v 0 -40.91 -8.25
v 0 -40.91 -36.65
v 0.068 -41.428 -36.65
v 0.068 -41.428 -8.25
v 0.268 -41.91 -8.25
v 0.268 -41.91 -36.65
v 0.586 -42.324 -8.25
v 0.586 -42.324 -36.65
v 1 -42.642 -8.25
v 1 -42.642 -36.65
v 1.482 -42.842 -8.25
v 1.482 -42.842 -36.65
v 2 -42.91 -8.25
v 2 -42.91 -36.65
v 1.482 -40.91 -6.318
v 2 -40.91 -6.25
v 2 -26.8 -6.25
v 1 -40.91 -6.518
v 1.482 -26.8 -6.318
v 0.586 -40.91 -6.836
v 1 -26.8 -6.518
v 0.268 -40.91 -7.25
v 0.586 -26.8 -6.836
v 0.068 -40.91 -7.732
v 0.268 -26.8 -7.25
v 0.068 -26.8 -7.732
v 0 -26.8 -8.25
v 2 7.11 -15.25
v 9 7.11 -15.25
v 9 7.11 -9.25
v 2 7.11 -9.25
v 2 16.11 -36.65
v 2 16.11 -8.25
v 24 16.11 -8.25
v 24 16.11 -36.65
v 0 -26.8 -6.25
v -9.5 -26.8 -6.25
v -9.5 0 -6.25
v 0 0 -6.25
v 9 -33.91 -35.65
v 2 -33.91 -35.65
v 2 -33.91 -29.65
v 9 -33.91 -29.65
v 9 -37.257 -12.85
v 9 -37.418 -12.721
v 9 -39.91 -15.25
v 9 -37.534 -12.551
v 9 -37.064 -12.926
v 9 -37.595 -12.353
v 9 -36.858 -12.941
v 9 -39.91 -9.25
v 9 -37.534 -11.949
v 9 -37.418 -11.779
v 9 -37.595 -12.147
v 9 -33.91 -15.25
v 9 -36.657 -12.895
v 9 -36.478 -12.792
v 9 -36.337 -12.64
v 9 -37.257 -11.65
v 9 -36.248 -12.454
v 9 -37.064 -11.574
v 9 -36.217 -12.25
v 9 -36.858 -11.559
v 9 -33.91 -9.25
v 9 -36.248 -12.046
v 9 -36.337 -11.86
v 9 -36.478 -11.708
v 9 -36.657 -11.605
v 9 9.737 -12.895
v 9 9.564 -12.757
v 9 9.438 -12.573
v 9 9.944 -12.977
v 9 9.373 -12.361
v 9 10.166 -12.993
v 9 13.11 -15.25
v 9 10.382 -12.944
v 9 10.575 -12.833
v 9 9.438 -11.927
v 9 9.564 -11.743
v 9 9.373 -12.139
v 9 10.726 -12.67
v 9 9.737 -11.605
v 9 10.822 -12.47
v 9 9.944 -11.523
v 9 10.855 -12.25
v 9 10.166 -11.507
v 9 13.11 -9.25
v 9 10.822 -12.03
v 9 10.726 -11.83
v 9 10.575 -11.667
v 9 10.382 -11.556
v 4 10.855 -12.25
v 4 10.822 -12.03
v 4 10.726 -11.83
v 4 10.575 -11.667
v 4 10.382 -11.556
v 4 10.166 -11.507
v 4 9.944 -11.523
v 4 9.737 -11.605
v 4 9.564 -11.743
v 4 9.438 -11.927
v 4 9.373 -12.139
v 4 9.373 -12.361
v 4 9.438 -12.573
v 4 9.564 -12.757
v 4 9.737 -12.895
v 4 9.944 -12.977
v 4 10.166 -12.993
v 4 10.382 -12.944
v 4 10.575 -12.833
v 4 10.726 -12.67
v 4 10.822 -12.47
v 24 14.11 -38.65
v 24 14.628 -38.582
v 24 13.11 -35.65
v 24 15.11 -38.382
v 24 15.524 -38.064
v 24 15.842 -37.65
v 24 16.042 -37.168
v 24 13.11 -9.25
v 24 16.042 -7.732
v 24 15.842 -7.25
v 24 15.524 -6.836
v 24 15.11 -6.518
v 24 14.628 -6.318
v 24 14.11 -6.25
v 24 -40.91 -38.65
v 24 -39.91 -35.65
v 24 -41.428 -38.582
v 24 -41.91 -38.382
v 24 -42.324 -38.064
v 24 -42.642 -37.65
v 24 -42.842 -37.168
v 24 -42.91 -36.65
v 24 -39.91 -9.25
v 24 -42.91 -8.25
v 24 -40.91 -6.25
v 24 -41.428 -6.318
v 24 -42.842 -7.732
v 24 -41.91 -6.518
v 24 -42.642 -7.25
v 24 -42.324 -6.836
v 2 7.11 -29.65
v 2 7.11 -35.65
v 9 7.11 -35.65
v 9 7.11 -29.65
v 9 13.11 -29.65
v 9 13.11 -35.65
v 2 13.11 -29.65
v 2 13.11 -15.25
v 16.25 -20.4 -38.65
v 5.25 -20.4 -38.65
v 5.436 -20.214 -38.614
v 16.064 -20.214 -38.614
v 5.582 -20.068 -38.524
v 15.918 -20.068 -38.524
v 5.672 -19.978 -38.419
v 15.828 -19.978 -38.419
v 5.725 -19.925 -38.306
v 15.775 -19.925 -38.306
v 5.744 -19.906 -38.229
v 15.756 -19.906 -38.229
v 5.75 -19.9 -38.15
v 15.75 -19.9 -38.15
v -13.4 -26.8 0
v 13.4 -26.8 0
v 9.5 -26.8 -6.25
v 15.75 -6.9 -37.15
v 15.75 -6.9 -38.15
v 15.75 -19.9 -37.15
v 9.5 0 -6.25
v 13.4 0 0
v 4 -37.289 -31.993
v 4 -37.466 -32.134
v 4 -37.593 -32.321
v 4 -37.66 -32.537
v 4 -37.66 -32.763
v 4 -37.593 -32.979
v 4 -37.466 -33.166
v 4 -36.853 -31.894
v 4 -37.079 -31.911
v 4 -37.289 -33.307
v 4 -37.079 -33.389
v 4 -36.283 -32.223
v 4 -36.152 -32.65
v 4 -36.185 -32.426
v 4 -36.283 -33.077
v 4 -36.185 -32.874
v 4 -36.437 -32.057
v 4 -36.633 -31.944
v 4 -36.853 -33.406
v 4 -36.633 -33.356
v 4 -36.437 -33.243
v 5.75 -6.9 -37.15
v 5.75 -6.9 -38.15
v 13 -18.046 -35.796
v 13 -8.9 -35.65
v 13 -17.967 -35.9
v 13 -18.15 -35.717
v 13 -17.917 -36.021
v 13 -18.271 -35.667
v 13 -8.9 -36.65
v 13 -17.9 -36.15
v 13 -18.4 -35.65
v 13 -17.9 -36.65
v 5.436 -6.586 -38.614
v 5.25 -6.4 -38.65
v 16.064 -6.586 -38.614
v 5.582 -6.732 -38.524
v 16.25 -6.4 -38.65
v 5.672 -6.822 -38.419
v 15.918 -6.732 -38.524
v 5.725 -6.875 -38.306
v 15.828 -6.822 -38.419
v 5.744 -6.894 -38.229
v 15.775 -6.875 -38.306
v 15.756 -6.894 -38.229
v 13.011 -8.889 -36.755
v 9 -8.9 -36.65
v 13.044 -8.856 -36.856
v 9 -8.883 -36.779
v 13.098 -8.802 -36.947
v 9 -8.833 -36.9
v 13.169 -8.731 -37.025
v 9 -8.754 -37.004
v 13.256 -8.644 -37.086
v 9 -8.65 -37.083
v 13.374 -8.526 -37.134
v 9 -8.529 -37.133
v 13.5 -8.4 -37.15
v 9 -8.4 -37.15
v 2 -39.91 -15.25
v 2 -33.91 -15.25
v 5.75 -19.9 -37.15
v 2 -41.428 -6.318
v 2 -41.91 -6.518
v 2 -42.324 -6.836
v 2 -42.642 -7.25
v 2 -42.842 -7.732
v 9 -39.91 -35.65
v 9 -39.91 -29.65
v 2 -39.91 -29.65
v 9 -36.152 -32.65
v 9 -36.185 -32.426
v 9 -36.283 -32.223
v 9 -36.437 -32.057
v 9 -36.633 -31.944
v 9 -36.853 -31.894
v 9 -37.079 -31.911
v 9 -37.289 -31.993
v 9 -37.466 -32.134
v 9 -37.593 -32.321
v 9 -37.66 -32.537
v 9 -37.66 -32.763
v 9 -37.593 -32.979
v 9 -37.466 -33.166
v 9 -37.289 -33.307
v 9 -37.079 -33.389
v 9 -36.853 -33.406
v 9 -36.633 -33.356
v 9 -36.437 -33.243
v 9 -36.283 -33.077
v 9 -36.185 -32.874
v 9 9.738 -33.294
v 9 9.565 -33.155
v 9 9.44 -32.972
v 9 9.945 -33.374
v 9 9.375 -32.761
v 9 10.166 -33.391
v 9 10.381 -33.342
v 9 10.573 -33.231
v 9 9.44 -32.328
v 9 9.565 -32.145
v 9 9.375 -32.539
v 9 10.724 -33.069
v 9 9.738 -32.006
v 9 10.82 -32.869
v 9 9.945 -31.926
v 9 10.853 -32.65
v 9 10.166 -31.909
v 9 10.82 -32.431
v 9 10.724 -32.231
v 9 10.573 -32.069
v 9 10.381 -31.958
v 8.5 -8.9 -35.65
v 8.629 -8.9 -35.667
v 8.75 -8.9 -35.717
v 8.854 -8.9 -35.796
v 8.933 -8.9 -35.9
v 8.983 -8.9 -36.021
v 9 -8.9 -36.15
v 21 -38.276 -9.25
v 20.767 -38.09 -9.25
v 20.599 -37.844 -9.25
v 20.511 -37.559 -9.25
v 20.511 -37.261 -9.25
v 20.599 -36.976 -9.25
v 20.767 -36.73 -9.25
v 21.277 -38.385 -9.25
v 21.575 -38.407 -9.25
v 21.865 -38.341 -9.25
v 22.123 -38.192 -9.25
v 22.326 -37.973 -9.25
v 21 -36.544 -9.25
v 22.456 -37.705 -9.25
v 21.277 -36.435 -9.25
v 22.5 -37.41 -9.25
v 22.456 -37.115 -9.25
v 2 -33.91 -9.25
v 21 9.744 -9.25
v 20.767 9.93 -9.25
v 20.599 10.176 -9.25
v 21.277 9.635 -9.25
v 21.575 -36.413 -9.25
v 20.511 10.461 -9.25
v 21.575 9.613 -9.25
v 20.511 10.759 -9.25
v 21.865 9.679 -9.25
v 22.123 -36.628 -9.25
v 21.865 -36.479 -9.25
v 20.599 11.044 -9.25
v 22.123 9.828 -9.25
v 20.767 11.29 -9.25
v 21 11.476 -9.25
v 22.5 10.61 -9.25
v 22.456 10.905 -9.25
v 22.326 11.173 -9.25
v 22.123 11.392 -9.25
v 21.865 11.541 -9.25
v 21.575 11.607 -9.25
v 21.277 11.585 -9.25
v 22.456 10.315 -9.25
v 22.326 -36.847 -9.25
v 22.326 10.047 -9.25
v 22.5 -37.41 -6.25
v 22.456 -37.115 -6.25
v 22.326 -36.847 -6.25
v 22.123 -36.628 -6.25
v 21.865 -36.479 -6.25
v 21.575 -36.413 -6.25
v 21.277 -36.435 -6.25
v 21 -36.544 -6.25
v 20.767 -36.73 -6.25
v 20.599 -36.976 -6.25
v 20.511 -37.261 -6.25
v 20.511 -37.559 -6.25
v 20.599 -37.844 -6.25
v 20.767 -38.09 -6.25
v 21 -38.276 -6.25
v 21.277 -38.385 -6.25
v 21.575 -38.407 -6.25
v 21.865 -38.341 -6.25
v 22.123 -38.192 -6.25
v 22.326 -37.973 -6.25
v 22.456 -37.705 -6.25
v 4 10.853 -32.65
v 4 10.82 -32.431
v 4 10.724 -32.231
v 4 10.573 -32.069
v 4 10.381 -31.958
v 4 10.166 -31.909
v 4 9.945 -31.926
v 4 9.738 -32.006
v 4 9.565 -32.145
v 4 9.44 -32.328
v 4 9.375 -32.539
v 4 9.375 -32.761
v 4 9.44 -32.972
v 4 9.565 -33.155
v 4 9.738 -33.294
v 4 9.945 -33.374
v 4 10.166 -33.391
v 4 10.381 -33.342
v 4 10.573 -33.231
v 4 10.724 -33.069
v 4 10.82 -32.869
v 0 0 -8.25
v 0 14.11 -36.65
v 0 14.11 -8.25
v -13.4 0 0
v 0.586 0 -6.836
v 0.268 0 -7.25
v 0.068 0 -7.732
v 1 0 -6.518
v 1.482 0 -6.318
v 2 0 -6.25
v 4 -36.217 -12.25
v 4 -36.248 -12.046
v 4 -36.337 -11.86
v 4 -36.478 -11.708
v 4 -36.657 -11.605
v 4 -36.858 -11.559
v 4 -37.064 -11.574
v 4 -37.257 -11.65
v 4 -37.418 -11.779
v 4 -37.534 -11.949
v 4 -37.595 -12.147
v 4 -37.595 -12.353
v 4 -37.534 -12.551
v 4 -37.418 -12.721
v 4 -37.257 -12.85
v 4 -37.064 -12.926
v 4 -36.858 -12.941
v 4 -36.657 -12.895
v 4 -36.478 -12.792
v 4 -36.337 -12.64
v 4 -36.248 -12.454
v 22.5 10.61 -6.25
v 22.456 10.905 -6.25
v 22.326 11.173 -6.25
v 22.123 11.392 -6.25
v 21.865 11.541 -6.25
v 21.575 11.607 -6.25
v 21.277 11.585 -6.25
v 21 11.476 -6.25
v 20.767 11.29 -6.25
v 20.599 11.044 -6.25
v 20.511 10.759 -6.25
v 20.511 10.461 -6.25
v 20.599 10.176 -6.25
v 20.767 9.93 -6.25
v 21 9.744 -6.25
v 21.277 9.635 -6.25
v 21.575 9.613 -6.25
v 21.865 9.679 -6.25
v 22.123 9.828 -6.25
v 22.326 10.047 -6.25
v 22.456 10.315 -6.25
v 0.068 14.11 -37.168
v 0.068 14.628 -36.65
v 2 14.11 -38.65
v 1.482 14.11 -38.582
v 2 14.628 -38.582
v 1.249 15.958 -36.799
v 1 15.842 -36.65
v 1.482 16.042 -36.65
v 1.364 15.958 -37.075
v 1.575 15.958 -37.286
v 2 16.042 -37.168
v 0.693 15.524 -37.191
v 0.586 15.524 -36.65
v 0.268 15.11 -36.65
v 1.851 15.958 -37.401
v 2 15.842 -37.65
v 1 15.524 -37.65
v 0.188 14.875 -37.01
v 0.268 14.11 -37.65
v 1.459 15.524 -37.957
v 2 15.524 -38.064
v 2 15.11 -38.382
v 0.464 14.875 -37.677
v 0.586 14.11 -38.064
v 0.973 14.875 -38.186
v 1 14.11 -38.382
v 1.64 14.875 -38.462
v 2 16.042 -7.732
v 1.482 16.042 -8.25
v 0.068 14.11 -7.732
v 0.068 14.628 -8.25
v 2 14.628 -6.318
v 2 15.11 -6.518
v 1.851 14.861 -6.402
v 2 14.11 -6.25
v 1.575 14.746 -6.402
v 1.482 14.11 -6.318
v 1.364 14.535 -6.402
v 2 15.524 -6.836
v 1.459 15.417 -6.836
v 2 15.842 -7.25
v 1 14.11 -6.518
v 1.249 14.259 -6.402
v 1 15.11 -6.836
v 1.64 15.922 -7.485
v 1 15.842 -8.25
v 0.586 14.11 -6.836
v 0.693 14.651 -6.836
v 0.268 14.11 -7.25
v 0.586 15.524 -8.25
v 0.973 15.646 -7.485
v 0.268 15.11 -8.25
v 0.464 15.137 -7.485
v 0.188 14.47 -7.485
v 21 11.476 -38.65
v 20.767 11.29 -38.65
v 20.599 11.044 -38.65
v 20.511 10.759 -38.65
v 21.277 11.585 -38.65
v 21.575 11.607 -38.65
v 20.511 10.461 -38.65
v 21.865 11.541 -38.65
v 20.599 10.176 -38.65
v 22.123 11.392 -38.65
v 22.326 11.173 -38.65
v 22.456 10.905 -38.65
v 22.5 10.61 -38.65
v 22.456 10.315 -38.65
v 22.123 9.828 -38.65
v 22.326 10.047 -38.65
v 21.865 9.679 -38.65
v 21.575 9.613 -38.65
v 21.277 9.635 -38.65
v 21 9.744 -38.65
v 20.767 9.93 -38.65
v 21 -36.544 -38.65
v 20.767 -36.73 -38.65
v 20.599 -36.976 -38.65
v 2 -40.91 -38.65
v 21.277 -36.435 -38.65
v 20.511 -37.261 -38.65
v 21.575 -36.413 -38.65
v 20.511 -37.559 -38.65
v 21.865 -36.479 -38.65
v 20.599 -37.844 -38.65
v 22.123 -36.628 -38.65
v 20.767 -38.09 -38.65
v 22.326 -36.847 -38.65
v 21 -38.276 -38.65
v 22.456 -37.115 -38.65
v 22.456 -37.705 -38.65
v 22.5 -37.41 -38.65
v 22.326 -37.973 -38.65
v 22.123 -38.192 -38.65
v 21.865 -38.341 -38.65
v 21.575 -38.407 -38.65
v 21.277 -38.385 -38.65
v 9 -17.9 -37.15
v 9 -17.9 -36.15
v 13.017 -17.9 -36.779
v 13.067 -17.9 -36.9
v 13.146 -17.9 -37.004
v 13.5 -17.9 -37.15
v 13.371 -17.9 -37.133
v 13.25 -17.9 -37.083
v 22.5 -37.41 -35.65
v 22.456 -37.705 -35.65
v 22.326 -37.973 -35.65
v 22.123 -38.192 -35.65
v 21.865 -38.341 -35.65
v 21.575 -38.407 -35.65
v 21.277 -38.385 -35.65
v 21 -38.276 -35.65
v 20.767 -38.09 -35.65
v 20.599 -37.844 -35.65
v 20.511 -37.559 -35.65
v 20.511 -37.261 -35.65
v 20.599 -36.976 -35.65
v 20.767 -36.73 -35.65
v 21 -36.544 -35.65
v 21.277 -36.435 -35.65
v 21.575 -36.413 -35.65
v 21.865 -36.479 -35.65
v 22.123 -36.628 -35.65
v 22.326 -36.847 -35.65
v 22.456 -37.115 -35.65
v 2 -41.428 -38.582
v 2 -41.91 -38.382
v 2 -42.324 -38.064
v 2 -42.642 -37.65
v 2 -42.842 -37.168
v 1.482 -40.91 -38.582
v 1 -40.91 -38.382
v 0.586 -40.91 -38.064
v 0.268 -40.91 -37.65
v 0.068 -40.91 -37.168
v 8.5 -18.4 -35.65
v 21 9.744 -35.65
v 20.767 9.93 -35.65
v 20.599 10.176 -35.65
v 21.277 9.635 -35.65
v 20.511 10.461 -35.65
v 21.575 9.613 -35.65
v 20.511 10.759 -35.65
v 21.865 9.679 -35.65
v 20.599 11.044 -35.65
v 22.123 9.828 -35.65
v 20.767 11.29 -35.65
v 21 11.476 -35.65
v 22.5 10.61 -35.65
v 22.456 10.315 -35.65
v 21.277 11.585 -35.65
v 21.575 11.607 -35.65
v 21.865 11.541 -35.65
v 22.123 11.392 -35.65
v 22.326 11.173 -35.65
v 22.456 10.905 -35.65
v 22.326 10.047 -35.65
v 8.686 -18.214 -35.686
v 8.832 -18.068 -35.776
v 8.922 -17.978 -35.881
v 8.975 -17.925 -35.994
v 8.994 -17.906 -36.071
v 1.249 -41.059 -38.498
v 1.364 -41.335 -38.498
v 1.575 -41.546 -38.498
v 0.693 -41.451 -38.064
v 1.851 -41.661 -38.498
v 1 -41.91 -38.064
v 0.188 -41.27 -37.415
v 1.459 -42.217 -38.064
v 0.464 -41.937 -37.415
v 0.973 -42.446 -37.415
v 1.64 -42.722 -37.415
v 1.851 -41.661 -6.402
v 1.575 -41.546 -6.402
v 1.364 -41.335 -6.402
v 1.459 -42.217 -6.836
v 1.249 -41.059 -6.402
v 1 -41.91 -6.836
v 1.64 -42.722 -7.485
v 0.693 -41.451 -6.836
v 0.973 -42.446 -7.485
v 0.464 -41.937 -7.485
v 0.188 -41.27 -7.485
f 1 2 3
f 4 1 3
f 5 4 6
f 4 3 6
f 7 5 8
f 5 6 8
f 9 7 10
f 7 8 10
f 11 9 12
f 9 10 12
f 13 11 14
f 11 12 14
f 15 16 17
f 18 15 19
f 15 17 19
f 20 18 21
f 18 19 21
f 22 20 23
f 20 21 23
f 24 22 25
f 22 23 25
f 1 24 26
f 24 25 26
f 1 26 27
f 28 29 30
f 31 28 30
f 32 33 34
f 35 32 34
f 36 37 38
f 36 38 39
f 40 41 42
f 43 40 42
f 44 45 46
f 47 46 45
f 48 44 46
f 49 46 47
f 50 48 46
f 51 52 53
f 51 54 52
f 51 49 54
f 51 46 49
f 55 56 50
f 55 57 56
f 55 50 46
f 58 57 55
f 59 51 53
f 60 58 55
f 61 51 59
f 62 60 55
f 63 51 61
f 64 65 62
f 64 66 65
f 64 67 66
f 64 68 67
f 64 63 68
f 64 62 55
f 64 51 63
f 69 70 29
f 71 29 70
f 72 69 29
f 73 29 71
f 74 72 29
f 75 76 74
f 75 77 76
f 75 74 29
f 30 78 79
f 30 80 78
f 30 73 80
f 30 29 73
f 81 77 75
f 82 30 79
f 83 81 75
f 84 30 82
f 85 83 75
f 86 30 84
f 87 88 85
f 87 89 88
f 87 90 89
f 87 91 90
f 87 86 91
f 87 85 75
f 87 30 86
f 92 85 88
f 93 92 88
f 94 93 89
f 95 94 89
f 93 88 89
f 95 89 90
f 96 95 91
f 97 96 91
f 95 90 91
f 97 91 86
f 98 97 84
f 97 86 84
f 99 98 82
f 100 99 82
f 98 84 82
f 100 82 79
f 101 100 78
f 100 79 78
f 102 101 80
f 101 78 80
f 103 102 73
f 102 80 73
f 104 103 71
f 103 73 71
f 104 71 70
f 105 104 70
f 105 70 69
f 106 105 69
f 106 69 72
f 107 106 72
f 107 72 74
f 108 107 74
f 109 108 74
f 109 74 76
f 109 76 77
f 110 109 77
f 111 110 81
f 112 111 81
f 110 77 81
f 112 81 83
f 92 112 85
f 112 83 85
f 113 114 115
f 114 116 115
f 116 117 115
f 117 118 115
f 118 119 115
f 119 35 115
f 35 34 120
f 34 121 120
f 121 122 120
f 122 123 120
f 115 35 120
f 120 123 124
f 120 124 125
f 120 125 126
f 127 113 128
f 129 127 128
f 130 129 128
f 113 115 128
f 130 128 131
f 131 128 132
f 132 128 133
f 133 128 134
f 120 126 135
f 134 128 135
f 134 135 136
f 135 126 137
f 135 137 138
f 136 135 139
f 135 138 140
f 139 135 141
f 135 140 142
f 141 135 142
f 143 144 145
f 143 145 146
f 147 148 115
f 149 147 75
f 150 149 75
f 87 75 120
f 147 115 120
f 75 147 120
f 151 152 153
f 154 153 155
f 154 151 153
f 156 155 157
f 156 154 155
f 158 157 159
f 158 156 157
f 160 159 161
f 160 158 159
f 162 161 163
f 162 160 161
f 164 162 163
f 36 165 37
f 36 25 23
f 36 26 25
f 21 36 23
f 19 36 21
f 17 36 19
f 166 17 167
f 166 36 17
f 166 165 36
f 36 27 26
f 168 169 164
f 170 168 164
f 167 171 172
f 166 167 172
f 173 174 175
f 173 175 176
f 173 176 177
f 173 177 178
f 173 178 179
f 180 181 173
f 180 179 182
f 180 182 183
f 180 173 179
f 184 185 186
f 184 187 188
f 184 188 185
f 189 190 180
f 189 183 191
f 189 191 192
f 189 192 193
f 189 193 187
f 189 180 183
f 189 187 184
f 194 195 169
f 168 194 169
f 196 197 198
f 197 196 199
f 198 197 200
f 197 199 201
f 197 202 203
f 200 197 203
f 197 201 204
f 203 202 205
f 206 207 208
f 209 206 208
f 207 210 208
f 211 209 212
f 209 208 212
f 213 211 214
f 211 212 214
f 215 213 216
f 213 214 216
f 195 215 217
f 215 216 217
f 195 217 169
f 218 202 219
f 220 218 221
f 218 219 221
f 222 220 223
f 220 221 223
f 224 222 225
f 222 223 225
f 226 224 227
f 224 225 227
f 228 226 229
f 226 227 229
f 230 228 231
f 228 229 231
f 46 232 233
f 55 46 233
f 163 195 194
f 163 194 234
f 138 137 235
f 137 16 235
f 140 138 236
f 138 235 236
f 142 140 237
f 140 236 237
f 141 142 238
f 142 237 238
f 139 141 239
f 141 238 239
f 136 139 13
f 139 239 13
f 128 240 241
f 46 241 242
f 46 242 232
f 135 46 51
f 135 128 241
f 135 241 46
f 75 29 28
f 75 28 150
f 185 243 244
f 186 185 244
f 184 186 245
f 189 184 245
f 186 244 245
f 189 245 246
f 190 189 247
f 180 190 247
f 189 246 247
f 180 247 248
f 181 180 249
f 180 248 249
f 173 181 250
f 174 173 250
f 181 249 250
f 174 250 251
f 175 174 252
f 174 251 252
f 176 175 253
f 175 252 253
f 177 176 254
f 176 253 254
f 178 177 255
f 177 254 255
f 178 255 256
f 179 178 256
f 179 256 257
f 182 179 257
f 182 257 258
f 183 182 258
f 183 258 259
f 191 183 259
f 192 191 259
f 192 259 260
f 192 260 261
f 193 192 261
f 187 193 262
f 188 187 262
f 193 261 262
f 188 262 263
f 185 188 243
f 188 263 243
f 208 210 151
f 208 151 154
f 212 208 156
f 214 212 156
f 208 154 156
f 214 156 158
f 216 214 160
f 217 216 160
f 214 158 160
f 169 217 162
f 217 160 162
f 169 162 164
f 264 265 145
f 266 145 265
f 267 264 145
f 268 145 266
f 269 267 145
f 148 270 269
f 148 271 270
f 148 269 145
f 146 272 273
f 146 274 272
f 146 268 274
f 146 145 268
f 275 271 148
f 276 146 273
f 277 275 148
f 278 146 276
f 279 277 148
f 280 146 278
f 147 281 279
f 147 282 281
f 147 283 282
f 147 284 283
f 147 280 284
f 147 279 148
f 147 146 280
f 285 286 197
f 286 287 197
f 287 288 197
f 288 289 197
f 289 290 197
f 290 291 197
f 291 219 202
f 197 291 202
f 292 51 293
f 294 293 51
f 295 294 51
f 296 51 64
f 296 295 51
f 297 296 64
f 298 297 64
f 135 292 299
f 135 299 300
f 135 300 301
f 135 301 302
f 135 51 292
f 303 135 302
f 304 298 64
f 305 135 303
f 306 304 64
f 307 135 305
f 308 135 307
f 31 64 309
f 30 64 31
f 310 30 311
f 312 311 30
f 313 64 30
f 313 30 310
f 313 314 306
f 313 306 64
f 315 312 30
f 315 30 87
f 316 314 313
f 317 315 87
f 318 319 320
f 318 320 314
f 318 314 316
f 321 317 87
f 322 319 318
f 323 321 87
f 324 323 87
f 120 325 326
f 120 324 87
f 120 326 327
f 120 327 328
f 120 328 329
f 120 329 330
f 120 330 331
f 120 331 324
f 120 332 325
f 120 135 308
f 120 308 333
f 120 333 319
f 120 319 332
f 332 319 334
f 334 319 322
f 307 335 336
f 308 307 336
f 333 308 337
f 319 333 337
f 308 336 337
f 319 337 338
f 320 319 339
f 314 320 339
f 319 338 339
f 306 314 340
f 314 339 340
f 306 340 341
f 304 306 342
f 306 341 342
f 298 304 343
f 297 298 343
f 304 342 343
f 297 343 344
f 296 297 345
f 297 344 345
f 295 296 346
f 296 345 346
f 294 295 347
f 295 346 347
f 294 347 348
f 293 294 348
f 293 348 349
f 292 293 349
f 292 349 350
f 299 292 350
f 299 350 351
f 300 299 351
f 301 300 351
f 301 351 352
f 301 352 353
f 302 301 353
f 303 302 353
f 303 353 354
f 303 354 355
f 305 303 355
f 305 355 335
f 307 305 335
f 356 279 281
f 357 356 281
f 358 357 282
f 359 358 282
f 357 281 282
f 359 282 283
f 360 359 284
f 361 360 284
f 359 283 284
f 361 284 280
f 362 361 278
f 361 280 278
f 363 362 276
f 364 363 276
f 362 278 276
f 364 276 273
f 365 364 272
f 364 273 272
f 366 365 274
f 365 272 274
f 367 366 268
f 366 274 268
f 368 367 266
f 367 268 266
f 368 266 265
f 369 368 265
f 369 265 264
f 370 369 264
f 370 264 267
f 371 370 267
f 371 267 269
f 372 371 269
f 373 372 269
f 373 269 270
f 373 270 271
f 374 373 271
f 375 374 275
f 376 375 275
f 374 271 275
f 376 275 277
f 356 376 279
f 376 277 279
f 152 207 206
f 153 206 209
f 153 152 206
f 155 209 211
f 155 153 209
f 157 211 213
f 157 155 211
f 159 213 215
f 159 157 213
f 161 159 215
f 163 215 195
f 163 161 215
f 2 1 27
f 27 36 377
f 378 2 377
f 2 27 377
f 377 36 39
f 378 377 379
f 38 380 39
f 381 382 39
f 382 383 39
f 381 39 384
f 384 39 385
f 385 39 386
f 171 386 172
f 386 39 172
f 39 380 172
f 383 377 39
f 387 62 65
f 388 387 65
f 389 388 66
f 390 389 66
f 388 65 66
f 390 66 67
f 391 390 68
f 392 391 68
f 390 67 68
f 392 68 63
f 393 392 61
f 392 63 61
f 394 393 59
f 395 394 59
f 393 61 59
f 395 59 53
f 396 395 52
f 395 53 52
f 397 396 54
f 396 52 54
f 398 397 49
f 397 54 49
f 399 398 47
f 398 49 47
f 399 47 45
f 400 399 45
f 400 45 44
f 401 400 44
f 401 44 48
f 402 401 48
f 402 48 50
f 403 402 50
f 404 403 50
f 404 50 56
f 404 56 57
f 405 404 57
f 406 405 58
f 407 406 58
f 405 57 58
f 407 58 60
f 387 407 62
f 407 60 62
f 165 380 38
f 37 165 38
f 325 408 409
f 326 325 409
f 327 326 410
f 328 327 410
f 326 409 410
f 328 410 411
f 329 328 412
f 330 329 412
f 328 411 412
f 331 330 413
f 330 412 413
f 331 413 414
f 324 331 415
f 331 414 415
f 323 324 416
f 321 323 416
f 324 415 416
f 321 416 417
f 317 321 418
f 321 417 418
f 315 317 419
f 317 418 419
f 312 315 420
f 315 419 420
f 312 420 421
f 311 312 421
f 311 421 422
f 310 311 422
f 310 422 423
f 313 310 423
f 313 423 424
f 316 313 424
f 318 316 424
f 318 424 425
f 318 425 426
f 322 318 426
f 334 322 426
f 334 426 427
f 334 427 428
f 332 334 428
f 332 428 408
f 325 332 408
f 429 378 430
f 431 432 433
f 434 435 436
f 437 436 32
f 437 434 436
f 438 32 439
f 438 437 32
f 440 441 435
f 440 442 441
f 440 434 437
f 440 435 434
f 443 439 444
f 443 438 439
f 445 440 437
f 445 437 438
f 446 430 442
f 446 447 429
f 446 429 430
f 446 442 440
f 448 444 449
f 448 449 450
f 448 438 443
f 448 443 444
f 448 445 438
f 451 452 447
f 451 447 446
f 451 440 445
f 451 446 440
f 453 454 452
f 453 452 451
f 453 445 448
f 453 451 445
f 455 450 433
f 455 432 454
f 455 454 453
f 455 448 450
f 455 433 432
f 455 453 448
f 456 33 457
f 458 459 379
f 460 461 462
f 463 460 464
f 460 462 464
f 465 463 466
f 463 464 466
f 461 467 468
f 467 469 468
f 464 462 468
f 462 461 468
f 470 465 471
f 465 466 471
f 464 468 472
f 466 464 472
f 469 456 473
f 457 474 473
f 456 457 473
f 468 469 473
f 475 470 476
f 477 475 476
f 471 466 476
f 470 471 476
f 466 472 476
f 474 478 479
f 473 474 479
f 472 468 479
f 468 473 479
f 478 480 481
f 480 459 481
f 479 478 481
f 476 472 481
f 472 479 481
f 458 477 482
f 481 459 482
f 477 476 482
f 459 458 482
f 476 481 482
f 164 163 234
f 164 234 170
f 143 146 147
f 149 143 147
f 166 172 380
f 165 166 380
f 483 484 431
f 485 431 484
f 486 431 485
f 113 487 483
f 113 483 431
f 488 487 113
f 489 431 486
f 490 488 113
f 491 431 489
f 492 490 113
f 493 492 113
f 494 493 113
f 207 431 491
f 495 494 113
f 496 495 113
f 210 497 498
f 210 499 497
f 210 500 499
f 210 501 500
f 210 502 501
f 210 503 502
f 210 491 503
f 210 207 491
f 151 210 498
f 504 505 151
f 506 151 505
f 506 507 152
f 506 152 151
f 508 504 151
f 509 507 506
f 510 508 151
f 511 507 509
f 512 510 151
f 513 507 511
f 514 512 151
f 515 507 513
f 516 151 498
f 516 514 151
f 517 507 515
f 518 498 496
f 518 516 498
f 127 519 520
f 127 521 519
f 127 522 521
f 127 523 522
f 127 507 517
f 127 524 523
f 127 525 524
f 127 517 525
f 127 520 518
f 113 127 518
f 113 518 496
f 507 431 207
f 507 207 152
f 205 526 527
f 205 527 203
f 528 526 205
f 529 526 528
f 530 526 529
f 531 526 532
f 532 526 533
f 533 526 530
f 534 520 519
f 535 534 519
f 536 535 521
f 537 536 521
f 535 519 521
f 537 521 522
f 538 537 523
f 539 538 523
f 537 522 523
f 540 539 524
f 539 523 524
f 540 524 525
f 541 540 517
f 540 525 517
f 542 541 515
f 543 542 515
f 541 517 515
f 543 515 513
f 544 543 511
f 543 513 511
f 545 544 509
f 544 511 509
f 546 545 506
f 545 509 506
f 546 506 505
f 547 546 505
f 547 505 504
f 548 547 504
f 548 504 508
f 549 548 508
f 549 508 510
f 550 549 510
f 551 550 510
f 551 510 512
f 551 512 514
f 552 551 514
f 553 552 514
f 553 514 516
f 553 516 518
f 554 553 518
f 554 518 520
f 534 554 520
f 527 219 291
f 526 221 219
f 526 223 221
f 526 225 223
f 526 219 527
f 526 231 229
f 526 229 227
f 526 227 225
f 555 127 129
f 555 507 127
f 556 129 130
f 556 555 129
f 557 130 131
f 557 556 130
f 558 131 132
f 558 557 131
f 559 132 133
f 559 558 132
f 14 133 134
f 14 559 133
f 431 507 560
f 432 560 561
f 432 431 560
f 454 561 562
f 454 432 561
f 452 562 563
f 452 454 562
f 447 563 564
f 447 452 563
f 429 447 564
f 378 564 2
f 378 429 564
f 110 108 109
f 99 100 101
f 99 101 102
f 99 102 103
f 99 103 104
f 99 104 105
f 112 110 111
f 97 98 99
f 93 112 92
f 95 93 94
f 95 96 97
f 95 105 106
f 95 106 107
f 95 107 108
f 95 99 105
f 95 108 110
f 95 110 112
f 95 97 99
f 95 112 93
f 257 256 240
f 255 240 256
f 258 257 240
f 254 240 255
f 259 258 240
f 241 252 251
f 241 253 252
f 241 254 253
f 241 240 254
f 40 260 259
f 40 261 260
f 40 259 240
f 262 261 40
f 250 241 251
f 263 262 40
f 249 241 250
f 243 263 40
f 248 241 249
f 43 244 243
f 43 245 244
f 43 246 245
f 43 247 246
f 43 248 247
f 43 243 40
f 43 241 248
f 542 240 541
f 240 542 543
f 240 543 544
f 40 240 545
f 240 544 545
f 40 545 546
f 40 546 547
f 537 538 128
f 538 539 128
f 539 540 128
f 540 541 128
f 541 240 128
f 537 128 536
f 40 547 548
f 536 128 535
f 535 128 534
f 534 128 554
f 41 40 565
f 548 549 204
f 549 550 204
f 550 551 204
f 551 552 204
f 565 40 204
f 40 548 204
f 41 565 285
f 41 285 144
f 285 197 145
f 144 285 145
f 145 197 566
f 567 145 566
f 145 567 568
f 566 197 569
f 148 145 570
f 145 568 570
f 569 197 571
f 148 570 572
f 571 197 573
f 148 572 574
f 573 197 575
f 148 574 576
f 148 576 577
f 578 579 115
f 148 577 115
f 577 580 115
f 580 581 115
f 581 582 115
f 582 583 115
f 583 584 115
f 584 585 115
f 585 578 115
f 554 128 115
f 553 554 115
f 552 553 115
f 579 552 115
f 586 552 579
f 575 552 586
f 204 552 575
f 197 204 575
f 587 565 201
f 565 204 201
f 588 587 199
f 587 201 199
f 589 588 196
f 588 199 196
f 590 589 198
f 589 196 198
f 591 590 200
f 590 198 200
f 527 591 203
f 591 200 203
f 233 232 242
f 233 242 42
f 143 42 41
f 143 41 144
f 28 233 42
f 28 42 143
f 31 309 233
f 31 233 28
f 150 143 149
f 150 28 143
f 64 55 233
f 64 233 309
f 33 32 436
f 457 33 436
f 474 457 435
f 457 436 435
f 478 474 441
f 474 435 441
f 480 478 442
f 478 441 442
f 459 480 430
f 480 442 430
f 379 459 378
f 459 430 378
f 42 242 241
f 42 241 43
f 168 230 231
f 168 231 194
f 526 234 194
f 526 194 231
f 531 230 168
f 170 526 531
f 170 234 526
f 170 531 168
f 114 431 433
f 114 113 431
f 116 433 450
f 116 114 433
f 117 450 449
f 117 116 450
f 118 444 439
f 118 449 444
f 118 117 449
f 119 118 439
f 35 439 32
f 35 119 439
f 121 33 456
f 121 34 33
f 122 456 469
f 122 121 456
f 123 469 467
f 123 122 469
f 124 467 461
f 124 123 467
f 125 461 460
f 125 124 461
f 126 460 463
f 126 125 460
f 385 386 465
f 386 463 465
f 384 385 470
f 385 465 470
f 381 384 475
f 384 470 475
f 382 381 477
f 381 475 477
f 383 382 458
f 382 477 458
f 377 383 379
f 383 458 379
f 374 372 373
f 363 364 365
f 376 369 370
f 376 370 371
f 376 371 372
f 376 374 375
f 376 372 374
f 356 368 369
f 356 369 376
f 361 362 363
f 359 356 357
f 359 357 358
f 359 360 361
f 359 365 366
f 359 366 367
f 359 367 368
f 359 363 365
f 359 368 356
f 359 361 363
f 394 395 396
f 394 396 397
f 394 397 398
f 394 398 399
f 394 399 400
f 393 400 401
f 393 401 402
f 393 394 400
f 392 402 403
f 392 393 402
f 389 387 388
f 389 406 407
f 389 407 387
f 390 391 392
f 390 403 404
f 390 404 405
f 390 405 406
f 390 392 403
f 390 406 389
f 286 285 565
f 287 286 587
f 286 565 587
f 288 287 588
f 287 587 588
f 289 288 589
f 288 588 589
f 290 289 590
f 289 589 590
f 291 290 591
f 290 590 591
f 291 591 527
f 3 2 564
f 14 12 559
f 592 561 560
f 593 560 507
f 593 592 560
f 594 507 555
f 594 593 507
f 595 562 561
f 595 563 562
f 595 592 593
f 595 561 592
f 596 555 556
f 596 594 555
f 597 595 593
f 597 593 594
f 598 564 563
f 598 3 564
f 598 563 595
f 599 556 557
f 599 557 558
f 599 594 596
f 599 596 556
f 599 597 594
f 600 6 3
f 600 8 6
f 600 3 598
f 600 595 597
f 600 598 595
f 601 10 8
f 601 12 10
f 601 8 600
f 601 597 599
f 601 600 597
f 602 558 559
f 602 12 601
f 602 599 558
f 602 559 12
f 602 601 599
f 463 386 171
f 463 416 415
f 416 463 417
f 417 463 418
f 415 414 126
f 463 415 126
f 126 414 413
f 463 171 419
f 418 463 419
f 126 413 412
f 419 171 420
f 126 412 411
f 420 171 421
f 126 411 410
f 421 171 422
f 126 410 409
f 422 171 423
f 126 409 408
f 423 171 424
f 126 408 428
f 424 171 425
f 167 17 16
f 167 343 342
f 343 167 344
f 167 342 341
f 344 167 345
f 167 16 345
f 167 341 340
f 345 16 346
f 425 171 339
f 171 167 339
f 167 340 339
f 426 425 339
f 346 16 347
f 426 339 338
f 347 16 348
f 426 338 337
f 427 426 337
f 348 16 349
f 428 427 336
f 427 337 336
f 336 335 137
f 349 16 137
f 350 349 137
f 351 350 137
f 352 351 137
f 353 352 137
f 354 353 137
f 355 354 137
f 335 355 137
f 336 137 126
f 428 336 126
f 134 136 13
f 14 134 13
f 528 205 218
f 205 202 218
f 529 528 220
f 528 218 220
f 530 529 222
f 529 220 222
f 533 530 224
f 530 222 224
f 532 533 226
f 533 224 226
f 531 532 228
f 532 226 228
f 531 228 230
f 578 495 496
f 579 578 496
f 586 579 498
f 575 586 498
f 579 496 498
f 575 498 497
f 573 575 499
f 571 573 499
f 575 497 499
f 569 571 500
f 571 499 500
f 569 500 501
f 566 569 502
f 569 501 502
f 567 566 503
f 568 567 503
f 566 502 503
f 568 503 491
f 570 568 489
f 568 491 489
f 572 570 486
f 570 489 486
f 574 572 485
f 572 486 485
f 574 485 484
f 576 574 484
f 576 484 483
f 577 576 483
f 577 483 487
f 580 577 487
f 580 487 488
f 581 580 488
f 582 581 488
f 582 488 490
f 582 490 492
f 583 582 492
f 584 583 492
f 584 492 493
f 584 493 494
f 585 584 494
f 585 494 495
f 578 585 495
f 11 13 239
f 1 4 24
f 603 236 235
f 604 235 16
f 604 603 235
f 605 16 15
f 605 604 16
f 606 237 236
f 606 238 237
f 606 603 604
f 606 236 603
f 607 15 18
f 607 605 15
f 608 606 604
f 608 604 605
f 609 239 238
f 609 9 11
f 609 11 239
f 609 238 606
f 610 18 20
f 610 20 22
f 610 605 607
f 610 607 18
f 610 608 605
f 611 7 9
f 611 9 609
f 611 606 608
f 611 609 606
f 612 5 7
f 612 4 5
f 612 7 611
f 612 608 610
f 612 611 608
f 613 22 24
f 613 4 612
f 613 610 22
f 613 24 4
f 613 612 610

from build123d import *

# Parameters (mm, degrees)
F1_DEPTH  = 26.8
F2_W      = 9.5
F2_H      = 26.8
F3_DEPTH  = 32.4
F4_W      = 53.02
F4_H      = 26.4
F5_DEPTH  = 15
F6_W      = 41.02
F6_H      = 26.4
F7_DEPTH  = 7
F8_W      = 33.1776287834
F8_H      = 14.4
F9_DEPTH  = 7
F10_W     = 16.1501816639
F10_H     = 14.4
F11_DEPTH = 7
F12_R     = 0.6930745825
F13_DEPTH = 5
F14_R     = 0.7453155857
F15_DEPTH = 5
F16_R     = 0.7584591481
F17_DEPTH = 5
F18_R     = 0.7431215043
F19_DEPTH = 5
F20_W     = 4
F20_H     = 9
F21_DEPTH = 5
F22_W     = 10
F22_H     = 13
F23_DEPTH = 1.5
F24_R     = 0.5
F25_R     = 2
F26_R     = 1
F27_DEPTH = 5
F28_R     = 1
F29_DEPTH = 5
F30_R     = 1
F31_DEPTH = 5
F32_R     = 1
F33_DEPTH = 5


with BuildPart() as f1:
    # F0 (on Front) → F1 (new body)
    with BuildSketch(Plane.XZ):
        Polygon((13.4, 0), (-13.4, 0), (-9.5, -6.25), (9.5, -6.25), align=None)
    extrude(amount=F1_DEPTH)

    # F2 (on face) → F3 (join)
    with BuildSketch(Plane(origin=(0, 0, -6.25), x_dir=(1, 0, 0), z_dir=(0, 0, -1))):
        Polygon((24, 42.91), (0, 42.91), (0, 26.8), (9.5, 26.8), (9.5, 0), (0, 0), (0, -16.11), (24, -16.11), align=None)
        with Locations((4.75, 13.4)):
            Rectangle(F2_W, F2_H)
    extrude(amount=F3_DEPTH)

    # F4 (on face) → F5 (cut)
    with BuildSketch(Plane.YZ.offset(24)):
        with Locations((-13.4, -22.45)):
            Rectangle(F4_W, F4_H)
    extrude(amount=-F5_DEPTH, mode=Mode.SUBTRACT)

    # F6 (on face) → F7 (cut)
    with BuildSketch(Plane.YZ.offset(9)):
        with Locations((-13.4, -22.45)):
            Rectangle(F6_W, F6_H)
    extrude(amount=-F7_DEPTH, mode=Mode.SUBTRACT)

    # F8 (on face) → F9 (cut)
    with BuildSketch(Plane.YZ.offset(9)):
        with Locations((-23.3211856083, -22.45)):
            Rectangle(F8_W, F8_H)
    extrude(amount=-F9_DEPTH, mode=Mode.SUBTRACT)

    # F10 (on face) → F11 (cut)
    with BuildSketch(Plane.YZ.offset(9)):
        with Locations((5.0349091681, -22.45)):
            Rectangle(F10_W, F10_H)
    extrude(amount=-F11_DEPTH, mode=Mode.SUBTRACT)

    # F12 (on face) → F13 (cut)
    with BuildSketch(Plane.YZ.offset(9)):
        with Locations((-36.91, -12.25)):
            Circle(F12_R)
    extrude(amount=-F13_DEPTH, mode=Mode.SUBTRACT)

    # F14 (on face) → F15 (cut)
    with BuildSketch(Plane.YZ.offset(9)):
        with Locations((10.11, -12.25)):
            Circle(F14_R)
    extrude(amount=-F15_DEPTH, mode=Mode.SUBTRACT)

    # F16 (on face) → F17 (cut)
    with BuildSketch(Plane.YZ.offset(9)):
        with Locations((-36.91, -32.65)):
            Circle(F16_R)
    extrude(amount=-F17_DEPTH, mode=Mode.SUBTRACT)

    # F18 (on face) → F19 (cut)
    with BuildSketch(Plane.YZ.offset(9)):
        with Locations((10.11, -32.65)):
            Circle(F18_R)
    extrude(amount=-F19_DEPTH, mode=Mode.SUBTRACT)

    # F20 (on face) → F21 (cut)
    with BuildSketch(Plane(origin=(0, 0, -38.65), x_dir=(1, 0, 0), z_dir=(0, 0, -1))):
        with Locations((11, 13.4)):
            Rectangle(F20_W, F20_H)
    extrude(amount=-F21_DEPTH, mode=Mode.SUBTRACT)

    # F22 (on face) → F23 (cut)
    with BuildSketch(Plane(origin=(0, 0, -38.65), x_dir=(1, 0, 0), z_dir=(0, 0, -1))):
        with Locations((10.75, 13.4)):
            Rectangle(F22_W, F22_H)
    extrude(amount=-F23_DEPTH, mode=Mode.SUBTRACT)

    # F24
    f24_edges = [f1.edges().sort_by_distance(p)[0] for p in [
        (5.75, -13.4, -38.65),
        (9, -13.4, -35.65),
        (13, -13.4, -37.15),
        (10.75, -6.9, -38.65),
        (11, -8.9, -37.15),
        (11, -17.9, -35.65),
        (15.75, -13.4, -38.65),
        (10.75, -19.9, -38.65),
    ]]
    fillet(f24_edges, radius=F24_R)

    # F25
    f25_edges = [f1.edges().sort_by_distance(p)[0] for p in [
        (0, -42.91, -22.45),
        (0, -13.4, -38.65),
        (0, 16.11, -22.45),
        (12, -42.91, -38.65),
        (12, -42.91, -6.25),
        (12, 16.11, -38.65),
        (12, 16.11, -6.25),
        (0, 8.055, -6.25),
        (0, -34.855, -6.25),
    ]]
    fillet(f25_edges, radius=F25_R)

    # F26 (on face) → F27 (cut)
    with BuildSketch(Plane(origin=(0, 0, -38.65), x_dir=(1, 0, 0), z_dir=(0, 0, -1))):
        with Locations((21.5, 37.41)):
            Circle(F26_R)
    extrude(amount=-F27_DEPTH, mode=Mode.SUBTRACT)

    # F28 (on face) → F29 (cut)
    with BuildSketch(Plane(origin=(0, 0, -38.65), x_dir=(1, 0, 0), z_dir=(0, 0, -1))):
        with Locations((21.5, -10.61)):
            Circle(F28_R)
    extrude(amount=-F29_DEPTH, mode=Mode.SUBTRACT)

    # F30 (on face) → F31 (cut)
    with BuildSketch(Plane.XY.offset(-6.25)):
        with Locations((21.5, 10.61)):
            Circle(F30_R)
    extrude(amount=-F31_DEPTH, mode=Mode.SUBTRACT)

    # F32 (on face) → F33 (cut)
    with BuildSketch(Plane.XY.offset(-6.25)):
        with Locations((21.5, -37.41)):
            Circle(F32_R)
    extrude(amount=-F33_DEPTH, mode=Mode.SUBTRACT)


solid = f1.part
